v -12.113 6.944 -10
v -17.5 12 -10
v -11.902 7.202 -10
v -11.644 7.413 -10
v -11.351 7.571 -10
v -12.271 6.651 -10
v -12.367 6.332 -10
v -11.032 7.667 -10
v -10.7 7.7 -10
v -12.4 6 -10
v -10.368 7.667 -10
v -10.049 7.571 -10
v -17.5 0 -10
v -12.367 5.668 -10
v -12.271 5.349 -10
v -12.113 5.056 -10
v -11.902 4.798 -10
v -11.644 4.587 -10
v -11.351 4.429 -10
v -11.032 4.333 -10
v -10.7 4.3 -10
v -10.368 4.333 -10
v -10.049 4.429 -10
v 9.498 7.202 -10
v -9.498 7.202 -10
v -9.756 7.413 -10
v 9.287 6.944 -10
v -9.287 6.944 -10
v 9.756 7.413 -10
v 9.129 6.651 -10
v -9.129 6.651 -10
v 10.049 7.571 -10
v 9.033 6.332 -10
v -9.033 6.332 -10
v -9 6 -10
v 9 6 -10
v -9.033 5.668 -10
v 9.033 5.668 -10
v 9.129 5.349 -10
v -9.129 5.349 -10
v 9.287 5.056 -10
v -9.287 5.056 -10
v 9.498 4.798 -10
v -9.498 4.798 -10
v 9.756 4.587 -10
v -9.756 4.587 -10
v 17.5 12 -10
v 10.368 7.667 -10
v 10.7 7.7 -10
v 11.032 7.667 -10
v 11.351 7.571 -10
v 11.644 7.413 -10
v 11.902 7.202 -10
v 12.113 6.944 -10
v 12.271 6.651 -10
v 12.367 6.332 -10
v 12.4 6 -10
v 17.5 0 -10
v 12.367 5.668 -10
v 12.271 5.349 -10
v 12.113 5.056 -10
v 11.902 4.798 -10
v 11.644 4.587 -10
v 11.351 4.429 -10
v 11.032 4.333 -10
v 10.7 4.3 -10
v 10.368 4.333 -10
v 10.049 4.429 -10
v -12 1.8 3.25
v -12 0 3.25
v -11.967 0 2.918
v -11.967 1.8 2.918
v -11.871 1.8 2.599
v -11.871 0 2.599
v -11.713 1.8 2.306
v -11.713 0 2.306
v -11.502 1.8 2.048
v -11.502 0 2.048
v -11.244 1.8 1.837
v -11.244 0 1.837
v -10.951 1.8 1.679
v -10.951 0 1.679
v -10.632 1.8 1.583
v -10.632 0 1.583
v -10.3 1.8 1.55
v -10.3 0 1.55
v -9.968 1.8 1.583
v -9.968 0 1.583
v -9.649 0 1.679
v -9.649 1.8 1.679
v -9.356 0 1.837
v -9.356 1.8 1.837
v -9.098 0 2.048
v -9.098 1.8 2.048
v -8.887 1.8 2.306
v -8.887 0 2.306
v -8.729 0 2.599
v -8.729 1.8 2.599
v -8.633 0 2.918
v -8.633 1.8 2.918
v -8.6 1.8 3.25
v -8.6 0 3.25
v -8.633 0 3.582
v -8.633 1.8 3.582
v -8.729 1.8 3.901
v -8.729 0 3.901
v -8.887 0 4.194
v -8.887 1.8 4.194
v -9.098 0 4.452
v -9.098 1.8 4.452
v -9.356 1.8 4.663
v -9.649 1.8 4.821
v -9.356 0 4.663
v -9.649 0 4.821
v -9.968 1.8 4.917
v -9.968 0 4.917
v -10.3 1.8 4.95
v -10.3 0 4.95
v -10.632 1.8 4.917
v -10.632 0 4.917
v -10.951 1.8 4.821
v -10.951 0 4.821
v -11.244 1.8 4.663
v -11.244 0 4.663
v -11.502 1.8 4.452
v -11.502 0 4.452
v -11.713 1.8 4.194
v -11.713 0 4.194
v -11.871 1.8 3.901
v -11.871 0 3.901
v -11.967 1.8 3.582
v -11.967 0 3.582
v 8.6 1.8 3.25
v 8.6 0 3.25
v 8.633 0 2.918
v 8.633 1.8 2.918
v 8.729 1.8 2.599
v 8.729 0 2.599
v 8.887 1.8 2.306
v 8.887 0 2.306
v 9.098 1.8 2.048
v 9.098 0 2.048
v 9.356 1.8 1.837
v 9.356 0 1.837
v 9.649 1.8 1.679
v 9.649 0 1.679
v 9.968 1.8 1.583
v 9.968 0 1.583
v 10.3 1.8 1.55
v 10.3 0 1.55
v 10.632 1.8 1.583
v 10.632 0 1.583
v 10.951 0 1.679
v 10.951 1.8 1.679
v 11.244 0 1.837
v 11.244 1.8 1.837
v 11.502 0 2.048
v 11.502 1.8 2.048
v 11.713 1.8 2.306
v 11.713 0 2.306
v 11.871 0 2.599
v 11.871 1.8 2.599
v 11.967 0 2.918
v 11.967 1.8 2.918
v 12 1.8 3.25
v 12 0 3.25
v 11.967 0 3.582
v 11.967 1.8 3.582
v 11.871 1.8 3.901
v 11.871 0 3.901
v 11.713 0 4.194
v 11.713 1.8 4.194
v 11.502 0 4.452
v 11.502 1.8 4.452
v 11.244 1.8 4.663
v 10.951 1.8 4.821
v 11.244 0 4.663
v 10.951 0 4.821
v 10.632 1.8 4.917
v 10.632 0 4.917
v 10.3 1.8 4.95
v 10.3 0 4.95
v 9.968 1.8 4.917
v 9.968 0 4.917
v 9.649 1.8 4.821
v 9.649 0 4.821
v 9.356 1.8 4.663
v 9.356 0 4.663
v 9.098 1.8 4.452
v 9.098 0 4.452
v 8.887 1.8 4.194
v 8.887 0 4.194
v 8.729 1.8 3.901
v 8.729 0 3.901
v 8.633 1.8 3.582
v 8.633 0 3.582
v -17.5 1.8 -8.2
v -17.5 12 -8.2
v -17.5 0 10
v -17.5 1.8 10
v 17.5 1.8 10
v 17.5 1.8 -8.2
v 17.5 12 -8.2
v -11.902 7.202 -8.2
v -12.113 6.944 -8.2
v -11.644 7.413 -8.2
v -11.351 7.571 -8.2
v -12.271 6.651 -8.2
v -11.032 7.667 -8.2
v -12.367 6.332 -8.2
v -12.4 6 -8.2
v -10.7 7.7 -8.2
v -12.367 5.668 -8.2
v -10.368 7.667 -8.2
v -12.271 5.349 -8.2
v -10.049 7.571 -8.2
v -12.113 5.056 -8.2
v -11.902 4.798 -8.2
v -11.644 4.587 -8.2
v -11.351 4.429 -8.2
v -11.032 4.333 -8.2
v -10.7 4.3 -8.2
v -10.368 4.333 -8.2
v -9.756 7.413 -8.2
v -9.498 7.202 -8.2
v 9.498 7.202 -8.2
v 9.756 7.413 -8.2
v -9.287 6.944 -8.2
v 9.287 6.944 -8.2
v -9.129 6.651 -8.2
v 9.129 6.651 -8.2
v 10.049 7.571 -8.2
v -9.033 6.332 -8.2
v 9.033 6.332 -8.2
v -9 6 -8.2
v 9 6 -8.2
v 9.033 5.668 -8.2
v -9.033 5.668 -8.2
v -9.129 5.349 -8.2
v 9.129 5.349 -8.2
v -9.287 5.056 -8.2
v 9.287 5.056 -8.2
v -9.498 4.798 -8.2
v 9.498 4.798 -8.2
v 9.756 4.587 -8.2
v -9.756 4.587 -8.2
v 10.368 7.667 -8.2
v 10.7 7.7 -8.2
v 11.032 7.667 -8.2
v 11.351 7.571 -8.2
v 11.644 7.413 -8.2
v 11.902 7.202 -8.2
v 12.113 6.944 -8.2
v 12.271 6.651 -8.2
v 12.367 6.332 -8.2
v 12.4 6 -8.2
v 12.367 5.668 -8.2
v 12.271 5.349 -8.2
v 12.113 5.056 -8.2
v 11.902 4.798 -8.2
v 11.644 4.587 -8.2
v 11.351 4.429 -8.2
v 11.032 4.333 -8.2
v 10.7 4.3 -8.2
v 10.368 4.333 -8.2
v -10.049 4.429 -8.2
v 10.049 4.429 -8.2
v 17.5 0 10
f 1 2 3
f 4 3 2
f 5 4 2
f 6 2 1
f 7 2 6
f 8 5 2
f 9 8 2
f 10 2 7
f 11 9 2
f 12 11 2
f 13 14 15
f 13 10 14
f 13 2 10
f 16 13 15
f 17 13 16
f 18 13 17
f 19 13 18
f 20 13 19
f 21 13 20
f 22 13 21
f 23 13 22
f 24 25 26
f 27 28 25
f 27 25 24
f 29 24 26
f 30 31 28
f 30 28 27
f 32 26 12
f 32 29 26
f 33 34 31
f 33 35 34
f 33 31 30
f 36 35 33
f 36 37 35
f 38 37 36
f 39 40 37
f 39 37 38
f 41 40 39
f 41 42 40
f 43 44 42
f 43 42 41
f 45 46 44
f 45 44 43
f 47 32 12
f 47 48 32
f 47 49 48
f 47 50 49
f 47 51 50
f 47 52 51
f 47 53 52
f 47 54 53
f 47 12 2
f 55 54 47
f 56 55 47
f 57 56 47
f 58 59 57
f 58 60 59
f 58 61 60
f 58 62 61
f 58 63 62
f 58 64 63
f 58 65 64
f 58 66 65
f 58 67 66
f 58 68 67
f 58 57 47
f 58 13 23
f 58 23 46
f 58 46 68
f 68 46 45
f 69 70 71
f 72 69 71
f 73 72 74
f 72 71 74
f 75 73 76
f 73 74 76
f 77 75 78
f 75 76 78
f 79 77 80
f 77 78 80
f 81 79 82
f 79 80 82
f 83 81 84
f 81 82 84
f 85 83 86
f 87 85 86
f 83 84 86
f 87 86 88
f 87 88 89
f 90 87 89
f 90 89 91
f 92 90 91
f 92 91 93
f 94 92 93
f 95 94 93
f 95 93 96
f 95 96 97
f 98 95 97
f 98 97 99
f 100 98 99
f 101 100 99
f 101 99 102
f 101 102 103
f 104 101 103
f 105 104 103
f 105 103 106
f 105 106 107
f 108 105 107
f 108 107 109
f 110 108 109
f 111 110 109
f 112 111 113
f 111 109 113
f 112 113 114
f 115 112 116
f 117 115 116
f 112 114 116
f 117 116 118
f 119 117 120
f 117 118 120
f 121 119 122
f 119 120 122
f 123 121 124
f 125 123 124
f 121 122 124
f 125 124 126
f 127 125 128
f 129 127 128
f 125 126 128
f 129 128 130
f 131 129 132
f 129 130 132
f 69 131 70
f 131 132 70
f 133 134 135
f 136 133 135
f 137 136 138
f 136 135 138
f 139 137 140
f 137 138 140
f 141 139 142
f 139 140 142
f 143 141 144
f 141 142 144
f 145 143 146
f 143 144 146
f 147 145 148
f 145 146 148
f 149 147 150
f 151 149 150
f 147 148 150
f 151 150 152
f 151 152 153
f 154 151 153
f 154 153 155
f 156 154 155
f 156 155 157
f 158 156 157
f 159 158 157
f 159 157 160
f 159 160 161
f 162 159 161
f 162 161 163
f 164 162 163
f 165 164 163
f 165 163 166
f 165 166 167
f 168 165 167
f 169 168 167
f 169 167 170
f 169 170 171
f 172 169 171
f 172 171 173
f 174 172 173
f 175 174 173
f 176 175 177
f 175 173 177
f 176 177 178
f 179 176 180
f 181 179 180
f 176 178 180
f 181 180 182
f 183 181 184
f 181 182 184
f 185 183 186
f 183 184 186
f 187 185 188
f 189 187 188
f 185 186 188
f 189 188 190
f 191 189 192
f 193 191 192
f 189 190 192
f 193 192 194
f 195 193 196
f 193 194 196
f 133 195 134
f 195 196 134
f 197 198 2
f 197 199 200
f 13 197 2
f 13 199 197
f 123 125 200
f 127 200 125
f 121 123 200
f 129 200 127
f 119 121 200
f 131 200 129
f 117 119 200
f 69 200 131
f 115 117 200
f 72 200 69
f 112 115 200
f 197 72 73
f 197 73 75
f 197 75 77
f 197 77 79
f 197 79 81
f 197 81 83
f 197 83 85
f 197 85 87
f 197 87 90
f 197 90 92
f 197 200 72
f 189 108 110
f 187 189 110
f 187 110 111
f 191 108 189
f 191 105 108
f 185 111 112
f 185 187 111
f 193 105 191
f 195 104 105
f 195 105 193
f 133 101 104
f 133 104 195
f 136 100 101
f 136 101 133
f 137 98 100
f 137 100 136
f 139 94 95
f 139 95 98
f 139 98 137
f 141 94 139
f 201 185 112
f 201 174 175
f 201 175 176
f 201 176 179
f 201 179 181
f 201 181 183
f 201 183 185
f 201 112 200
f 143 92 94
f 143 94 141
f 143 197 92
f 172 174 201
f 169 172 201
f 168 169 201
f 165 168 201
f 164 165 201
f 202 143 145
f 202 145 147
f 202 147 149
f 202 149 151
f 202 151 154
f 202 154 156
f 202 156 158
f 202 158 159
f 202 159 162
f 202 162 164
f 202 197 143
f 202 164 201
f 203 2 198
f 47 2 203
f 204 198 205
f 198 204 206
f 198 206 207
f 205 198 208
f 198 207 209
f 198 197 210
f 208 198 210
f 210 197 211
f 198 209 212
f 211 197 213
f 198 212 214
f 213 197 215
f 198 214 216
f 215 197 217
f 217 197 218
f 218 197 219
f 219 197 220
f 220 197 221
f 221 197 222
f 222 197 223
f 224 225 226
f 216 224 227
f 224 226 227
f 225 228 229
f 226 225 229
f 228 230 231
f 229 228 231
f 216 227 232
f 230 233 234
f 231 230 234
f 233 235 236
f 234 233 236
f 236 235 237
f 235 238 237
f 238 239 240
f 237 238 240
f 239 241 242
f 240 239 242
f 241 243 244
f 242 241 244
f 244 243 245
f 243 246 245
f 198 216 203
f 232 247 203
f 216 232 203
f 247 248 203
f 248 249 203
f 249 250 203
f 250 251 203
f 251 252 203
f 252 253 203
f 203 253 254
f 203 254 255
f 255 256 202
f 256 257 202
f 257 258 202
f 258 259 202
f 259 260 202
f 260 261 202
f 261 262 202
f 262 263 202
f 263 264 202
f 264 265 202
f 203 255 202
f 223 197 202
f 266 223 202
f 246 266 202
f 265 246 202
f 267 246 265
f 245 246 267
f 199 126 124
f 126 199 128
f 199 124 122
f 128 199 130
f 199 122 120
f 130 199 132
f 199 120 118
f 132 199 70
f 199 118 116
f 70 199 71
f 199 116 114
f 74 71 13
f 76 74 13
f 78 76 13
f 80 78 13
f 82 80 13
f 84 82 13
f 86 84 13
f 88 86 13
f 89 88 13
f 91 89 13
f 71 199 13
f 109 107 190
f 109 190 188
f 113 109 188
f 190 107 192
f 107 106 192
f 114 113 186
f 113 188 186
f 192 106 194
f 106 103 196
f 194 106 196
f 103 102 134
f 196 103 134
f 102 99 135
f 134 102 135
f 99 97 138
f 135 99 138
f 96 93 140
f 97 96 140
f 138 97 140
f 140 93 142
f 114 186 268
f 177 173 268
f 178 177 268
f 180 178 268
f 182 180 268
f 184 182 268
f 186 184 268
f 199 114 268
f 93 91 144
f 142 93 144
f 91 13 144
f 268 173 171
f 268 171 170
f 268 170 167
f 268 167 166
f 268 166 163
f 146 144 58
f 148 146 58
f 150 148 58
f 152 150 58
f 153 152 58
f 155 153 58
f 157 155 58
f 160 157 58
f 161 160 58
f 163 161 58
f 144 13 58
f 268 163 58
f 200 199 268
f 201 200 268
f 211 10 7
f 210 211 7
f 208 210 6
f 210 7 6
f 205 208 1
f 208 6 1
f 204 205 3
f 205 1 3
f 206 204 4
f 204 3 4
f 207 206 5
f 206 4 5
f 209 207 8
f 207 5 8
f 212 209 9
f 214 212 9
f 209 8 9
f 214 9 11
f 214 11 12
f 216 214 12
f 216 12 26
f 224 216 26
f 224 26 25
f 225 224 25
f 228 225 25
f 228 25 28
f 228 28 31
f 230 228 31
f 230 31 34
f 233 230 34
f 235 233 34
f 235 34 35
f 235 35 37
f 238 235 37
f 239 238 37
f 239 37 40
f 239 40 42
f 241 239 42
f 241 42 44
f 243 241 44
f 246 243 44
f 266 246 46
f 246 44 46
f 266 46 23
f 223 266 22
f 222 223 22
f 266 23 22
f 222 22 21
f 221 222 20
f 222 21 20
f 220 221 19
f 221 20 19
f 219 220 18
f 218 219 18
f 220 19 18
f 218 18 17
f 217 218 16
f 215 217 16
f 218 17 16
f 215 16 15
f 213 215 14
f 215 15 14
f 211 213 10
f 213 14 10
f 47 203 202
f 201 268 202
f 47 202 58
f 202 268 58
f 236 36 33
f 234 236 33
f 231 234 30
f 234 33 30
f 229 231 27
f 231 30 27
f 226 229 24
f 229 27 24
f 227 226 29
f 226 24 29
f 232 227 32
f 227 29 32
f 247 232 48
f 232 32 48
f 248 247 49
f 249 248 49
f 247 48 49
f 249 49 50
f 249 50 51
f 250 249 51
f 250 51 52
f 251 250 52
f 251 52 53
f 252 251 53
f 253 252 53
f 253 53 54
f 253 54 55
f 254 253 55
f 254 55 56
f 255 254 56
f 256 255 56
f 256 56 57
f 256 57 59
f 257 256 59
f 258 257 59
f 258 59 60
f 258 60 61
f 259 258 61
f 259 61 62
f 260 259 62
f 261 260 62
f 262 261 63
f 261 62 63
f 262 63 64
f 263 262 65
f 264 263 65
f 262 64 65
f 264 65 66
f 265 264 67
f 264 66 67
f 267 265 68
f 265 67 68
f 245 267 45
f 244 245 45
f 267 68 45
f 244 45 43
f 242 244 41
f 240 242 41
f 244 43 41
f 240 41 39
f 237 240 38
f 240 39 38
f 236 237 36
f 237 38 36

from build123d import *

# Parameters (mm, degrees)
ESQUISSE1_W        = 35
ESQUISSE1_H        = 20
BOSS_EXTRU_1_DEPTH = 1.8
ESQUISSE2_W        = 35
ESQUISSE2_H        = 1.8
BOSS_EXTRU_2_DEPTH = 10.2
D_GAGEMENT_M31_D   = 3.4
D_GAGEMENT_M32_D   = 3.4


with BuildPart() as part:
    # Esquisse1 → Boss.-Extru.1 (new body)
    with BuildSketch(Plane(origin=(0, 0, 0), x_dir=(1, 0, 0), z_dir=(0, 1, 0))):
        Rectangle(ESQUISSE1_W, ESQUISSE1_H)
    extrude(amount=BOSS_EXTRU_1_DEPTH)

    # Esquisse2 → Boss.-Extru.2 (add)
    with BuildSketch(Plane(origin=(0, 1.8, 0), x_dir=(1, 0, 0), z_dir=(0, 1, 0))):
        with Locations((0, 9.1)):
            Rectangle(ESQUISSE2_W, ESQUISSE2_H)
    extrude(amount=BOSS_EXTRU_2_DEPTH)

    # Dégagement M31 (through all)
    with Locations(Plane.XY.offset(-8.2)):
        with Locations((-10.7, 6), (10.7, 6)):
            Hole(D_GAGEMENT_M31_D / 2)

    # Dégagement M32 (through all)
    with Locations(Plane(origin=(0, 1.8, 0), x_dir=(1, 0, 0), z_dir=(0, 1, 0))):
        with Locations((-10.3, -3.25), (10.3, -3.25)):
            Hole(D_GAGEMENT_M32_D / 2)


solid = part.part
